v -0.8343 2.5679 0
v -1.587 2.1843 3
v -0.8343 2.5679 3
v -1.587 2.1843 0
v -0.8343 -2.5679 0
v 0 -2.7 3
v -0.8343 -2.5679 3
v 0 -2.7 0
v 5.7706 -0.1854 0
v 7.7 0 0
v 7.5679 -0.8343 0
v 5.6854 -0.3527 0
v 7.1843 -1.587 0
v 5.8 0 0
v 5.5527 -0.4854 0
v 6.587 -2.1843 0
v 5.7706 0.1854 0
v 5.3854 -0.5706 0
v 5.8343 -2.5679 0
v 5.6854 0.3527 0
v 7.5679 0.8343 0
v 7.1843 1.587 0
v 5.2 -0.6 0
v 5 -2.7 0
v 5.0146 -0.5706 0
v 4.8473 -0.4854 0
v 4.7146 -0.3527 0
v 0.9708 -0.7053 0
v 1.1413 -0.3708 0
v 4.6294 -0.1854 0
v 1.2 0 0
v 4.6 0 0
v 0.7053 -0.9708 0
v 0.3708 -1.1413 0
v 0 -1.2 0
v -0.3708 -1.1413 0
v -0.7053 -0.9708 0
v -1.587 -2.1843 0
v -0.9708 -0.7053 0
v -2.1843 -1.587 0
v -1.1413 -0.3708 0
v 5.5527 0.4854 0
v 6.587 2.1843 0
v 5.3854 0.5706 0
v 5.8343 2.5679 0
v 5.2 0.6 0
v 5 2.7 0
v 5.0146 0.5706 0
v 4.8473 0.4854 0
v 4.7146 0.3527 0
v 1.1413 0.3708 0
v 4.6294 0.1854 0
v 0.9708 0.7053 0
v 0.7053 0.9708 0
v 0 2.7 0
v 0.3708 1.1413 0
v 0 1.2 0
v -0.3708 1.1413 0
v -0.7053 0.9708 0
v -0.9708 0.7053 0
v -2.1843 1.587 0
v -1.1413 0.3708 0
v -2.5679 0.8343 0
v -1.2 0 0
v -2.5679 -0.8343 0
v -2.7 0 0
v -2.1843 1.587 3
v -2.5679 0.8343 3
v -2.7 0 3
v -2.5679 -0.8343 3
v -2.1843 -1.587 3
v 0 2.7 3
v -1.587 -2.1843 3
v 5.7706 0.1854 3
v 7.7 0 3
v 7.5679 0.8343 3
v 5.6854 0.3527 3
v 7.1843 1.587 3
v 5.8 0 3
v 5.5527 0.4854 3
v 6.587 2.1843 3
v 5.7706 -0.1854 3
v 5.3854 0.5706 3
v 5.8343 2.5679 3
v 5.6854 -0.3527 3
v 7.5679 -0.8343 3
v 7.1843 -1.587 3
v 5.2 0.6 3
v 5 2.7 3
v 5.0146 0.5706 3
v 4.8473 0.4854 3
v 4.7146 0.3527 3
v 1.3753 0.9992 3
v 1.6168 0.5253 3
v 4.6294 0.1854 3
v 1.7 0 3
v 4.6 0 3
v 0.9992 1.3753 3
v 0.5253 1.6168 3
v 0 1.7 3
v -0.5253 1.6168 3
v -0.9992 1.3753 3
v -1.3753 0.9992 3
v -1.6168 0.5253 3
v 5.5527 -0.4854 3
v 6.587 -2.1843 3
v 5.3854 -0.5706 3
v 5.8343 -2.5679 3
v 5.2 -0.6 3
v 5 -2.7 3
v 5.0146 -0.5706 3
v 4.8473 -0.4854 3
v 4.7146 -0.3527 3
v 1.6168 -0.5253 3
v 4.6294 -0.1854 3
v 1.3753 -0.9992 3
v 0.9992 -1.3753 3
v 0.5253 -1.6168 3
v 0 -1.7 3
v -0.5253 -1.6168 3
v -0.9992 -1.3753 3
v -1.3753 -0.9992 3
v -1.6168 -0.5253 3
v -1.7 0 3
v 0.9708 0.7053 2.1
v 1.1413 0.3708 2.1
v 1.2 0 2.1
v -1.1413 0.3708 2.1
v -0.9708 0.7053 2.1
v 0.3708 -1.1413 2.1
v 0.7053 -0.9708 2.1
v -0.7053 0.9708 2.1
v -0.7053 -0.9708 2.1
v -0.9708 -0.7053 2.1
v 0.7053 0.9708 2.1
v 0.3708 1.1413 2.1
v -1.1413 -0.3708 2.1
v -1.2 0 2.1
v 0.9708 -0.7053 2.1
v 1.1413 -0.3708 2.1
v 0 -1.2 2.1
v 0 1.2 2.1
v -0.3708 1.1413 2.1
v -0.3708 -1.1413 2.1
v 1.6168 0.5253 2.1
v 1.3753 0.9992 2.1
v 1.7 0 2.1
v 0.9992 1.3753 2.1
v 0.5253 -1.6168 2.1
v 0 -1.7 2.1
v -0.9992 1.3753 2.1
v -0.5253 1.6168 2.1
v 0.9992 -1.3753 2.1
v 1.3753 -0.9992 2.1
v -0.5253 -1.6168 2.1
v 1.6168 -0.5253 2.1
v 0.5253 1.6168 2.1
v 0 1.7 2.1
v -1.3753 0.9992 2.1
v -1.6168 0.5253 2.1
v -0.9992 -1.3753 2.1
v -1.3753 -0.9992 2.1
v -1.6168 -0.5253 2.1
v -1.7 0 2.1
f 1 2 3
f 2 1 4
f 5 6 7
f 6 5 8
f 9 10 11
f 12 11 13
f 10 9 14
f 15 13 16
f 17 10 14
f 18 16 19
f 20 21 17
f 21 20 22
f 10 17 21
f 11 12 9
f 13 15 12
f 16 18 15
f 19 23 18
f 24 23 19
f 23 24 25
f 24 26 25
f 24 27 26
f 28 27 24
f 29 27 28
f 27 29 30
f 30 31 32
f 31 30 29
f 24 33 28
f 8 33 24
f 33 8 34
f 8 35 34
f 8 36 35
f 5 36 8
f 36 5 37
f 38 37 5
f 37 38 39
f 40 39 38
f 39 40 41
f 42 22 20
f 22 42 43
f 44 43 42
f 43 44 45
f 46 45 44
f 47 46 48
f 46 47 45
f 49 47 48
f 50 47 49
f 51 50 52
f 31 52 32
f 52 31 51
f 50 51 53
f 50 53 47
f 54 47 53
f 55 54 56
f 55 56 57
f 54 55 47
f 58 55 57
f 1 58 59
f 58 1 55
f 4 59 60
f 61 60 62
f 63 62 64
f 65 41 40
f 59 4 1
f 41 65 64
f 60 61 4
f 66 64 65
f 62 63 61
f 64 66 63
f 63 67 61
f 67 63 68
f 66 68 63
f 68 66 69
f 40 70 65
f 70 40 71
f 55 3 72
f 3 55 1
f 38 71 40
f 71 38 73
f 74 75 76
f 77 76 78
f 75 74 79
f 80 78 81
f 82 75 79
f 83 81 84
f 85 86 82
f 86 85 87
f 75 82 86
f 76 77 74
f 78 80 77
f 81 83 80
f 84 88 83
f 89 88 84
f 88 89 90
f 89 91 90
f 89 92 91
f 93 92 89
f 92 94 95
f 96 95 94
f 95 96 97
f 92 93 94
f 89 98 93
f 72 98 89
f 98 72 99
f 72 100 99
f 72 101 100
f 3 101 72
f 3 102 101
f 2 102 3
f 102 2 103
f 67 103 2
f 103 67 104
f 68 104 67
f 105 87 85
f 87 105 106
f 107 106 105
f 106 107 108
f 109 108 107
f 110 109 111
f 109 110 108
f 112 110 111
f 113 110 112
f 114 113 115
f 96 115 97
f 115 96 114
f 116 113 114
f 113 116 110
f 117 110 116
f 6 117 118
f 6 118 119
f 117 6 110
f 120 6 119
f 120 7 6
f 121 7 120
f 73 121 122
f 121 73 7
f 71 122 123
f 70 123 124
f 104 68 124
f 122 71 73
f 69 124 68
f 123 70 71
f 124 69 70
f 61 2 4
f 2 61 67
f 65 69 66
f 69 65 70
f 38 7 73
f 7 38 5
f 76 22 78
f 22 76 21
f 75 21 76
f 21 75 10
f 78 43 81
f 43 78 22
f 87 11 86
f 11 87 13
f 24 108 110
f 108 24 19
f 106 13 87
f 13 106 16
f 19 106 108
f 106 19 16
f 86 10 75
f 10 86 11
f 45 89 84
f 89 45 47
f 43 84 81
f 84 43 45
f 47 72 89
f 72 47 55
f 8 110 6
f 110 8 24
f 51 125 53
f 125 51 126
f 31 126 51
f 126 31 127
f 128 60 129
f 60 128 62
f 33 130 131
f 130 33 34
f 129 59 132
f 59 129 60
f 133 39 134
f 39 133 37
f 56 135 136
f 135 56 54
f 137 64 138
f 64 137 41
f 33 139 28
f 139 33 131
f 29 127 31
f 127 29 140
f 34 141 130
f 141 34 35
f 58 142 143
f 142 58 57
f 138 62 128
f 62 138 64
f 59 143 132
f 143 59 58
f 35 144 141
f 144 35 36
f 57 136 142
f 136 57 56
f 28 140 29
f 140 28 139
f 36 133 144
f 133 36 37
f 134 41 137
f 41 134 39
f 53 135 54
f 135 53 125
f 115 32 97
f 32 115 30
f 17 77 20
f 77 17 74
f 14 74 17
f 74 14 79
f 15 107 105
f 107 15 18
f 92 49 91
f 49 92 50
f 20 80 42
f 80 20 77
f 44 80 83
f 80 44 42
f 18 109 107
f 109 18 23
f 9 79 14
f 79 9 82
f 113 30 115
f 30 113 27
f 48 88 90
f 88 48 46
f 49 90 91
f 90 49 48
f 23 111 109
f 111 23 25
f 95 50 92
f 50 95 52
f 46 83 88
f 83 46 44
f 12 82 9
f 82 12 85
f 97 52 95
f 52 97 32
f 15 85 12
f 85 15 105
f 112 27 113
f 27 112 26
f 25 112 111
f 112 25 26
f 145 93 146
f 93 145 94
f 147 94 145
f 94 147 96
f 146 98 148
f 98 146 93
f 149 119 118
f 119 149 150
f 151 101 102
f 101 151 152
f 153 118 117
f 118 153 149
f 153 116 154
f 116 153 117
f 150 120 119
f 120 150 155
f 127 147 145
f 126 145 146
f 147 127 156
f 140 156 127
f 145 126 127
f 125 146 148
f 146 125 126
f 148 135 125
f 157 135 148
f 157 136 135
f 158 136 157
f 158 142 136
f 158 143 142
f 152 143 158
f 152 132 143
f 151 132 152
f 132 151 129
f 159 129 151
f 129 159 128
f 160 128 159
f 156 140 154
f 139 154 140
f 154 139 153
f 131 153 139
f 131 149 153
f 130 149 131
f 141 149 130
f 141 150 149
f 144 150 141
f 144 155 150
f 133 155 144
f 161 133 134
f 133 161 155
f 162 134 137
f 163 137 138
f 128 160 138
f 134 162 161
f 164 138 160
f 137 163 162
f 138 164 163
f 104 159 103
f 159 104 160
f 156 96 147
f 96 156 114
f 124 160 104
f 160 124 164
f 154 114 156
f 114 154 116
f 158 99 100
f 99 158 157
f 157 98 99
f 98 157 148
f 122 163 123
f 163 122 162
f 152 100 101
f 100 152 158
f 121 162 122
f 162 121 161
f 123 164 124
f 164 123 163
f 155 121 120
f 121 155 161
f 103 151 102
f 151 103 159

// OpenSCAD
height = 3;
difference() 
{
    union()
    {
        cylinder(height, d = 5.4, $fn=20);
        translate(v = [5, 0, 0])
        {
            cylinder(height, d = 5.4, $fn=20);
        } 
        translate(v = [0, -2.7, 0])
        {
            cube(size = [5, 5.4, height]);
        } 
    }
    cylinder(h = height + 0.1, r = 1.2, $fn=20);
    translate(v = [5.2, 0, 0])
    {
        cylinder(h = height + 0.1, r = 0.6, $fn=20);
    } 
    translate(v = [0,0,2.1]) 
    {
        cylinder(h = height - 2, r = 1.7, $fn=20);
    }

}
